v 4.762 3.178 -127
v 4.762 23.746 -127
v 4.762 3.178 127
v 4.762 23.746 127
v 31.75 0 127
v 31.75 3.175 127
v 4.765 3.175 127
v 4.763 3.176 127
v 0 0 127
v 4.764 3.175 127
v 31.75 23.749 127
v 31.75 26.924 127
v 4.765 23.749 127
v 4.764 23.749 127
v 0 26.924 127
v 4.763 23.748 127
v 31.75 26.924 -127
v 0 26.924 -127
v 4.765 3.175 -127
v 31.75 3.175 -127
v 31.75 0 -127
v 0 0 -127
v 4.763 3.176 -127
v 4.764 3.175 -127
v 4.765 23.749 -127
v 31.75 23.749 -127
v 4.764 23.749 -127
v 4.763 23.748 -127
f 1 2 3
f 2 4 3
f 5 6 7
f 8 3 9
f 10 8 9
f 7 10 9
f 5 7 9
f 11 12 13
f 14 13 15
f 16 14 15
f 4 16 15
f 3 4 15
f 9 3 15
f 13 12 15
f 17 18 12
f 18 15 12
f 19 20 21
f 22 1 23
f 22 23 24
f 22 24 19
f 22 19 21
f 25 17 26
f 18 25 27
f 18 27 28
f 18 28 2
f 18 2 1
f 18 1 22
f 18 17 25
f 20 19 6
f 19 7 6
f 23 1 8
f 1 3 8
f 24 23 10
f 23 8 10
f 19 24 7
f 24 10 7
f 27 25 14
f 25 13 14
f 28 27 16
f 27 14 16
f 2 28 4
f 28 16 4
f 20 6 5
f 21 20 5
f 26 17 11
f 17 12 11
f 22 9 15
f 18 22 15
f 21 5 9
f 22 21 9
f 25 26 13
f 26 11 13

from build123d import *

# Parameters (mm, degrees)
BASECHANNELSE_DEPTH = 127


with BuildPart() as part:
    # Sketch1 → BaseChannelse (new, symmetric)
    with BuildSketch(Plane.XY):
        with BuildLine():
            Line((0, 0), (0, 26.924))
            Line((0, 26.924), (31.75, 26.924))
            Line((31.75, 26.924), (31.75, 23.749))
            Line((31.75, 23.749), (4.76504, 23.749))
            ThreePointArc((4.76504, 23.749), (4.763243949, 23.748256051), (4.7625, 23.74646))
            Line((4.7625, 23.74646), (4.7625, 3.17754))
            ThreePointArc((4.7625, 3.17754), (4.763243949, 3.175743949), (4.76504, 3.175))
            Line((4.76504, 3.175), (31.75, 3.175))
            Line((31.75, 3.175), (31.75, 0))
            Line((31.75, 0), (0, 0))
        make_face()
    extrude(amount=BASECHANNELSE_DEPTH, both=True)


solid = part.part
